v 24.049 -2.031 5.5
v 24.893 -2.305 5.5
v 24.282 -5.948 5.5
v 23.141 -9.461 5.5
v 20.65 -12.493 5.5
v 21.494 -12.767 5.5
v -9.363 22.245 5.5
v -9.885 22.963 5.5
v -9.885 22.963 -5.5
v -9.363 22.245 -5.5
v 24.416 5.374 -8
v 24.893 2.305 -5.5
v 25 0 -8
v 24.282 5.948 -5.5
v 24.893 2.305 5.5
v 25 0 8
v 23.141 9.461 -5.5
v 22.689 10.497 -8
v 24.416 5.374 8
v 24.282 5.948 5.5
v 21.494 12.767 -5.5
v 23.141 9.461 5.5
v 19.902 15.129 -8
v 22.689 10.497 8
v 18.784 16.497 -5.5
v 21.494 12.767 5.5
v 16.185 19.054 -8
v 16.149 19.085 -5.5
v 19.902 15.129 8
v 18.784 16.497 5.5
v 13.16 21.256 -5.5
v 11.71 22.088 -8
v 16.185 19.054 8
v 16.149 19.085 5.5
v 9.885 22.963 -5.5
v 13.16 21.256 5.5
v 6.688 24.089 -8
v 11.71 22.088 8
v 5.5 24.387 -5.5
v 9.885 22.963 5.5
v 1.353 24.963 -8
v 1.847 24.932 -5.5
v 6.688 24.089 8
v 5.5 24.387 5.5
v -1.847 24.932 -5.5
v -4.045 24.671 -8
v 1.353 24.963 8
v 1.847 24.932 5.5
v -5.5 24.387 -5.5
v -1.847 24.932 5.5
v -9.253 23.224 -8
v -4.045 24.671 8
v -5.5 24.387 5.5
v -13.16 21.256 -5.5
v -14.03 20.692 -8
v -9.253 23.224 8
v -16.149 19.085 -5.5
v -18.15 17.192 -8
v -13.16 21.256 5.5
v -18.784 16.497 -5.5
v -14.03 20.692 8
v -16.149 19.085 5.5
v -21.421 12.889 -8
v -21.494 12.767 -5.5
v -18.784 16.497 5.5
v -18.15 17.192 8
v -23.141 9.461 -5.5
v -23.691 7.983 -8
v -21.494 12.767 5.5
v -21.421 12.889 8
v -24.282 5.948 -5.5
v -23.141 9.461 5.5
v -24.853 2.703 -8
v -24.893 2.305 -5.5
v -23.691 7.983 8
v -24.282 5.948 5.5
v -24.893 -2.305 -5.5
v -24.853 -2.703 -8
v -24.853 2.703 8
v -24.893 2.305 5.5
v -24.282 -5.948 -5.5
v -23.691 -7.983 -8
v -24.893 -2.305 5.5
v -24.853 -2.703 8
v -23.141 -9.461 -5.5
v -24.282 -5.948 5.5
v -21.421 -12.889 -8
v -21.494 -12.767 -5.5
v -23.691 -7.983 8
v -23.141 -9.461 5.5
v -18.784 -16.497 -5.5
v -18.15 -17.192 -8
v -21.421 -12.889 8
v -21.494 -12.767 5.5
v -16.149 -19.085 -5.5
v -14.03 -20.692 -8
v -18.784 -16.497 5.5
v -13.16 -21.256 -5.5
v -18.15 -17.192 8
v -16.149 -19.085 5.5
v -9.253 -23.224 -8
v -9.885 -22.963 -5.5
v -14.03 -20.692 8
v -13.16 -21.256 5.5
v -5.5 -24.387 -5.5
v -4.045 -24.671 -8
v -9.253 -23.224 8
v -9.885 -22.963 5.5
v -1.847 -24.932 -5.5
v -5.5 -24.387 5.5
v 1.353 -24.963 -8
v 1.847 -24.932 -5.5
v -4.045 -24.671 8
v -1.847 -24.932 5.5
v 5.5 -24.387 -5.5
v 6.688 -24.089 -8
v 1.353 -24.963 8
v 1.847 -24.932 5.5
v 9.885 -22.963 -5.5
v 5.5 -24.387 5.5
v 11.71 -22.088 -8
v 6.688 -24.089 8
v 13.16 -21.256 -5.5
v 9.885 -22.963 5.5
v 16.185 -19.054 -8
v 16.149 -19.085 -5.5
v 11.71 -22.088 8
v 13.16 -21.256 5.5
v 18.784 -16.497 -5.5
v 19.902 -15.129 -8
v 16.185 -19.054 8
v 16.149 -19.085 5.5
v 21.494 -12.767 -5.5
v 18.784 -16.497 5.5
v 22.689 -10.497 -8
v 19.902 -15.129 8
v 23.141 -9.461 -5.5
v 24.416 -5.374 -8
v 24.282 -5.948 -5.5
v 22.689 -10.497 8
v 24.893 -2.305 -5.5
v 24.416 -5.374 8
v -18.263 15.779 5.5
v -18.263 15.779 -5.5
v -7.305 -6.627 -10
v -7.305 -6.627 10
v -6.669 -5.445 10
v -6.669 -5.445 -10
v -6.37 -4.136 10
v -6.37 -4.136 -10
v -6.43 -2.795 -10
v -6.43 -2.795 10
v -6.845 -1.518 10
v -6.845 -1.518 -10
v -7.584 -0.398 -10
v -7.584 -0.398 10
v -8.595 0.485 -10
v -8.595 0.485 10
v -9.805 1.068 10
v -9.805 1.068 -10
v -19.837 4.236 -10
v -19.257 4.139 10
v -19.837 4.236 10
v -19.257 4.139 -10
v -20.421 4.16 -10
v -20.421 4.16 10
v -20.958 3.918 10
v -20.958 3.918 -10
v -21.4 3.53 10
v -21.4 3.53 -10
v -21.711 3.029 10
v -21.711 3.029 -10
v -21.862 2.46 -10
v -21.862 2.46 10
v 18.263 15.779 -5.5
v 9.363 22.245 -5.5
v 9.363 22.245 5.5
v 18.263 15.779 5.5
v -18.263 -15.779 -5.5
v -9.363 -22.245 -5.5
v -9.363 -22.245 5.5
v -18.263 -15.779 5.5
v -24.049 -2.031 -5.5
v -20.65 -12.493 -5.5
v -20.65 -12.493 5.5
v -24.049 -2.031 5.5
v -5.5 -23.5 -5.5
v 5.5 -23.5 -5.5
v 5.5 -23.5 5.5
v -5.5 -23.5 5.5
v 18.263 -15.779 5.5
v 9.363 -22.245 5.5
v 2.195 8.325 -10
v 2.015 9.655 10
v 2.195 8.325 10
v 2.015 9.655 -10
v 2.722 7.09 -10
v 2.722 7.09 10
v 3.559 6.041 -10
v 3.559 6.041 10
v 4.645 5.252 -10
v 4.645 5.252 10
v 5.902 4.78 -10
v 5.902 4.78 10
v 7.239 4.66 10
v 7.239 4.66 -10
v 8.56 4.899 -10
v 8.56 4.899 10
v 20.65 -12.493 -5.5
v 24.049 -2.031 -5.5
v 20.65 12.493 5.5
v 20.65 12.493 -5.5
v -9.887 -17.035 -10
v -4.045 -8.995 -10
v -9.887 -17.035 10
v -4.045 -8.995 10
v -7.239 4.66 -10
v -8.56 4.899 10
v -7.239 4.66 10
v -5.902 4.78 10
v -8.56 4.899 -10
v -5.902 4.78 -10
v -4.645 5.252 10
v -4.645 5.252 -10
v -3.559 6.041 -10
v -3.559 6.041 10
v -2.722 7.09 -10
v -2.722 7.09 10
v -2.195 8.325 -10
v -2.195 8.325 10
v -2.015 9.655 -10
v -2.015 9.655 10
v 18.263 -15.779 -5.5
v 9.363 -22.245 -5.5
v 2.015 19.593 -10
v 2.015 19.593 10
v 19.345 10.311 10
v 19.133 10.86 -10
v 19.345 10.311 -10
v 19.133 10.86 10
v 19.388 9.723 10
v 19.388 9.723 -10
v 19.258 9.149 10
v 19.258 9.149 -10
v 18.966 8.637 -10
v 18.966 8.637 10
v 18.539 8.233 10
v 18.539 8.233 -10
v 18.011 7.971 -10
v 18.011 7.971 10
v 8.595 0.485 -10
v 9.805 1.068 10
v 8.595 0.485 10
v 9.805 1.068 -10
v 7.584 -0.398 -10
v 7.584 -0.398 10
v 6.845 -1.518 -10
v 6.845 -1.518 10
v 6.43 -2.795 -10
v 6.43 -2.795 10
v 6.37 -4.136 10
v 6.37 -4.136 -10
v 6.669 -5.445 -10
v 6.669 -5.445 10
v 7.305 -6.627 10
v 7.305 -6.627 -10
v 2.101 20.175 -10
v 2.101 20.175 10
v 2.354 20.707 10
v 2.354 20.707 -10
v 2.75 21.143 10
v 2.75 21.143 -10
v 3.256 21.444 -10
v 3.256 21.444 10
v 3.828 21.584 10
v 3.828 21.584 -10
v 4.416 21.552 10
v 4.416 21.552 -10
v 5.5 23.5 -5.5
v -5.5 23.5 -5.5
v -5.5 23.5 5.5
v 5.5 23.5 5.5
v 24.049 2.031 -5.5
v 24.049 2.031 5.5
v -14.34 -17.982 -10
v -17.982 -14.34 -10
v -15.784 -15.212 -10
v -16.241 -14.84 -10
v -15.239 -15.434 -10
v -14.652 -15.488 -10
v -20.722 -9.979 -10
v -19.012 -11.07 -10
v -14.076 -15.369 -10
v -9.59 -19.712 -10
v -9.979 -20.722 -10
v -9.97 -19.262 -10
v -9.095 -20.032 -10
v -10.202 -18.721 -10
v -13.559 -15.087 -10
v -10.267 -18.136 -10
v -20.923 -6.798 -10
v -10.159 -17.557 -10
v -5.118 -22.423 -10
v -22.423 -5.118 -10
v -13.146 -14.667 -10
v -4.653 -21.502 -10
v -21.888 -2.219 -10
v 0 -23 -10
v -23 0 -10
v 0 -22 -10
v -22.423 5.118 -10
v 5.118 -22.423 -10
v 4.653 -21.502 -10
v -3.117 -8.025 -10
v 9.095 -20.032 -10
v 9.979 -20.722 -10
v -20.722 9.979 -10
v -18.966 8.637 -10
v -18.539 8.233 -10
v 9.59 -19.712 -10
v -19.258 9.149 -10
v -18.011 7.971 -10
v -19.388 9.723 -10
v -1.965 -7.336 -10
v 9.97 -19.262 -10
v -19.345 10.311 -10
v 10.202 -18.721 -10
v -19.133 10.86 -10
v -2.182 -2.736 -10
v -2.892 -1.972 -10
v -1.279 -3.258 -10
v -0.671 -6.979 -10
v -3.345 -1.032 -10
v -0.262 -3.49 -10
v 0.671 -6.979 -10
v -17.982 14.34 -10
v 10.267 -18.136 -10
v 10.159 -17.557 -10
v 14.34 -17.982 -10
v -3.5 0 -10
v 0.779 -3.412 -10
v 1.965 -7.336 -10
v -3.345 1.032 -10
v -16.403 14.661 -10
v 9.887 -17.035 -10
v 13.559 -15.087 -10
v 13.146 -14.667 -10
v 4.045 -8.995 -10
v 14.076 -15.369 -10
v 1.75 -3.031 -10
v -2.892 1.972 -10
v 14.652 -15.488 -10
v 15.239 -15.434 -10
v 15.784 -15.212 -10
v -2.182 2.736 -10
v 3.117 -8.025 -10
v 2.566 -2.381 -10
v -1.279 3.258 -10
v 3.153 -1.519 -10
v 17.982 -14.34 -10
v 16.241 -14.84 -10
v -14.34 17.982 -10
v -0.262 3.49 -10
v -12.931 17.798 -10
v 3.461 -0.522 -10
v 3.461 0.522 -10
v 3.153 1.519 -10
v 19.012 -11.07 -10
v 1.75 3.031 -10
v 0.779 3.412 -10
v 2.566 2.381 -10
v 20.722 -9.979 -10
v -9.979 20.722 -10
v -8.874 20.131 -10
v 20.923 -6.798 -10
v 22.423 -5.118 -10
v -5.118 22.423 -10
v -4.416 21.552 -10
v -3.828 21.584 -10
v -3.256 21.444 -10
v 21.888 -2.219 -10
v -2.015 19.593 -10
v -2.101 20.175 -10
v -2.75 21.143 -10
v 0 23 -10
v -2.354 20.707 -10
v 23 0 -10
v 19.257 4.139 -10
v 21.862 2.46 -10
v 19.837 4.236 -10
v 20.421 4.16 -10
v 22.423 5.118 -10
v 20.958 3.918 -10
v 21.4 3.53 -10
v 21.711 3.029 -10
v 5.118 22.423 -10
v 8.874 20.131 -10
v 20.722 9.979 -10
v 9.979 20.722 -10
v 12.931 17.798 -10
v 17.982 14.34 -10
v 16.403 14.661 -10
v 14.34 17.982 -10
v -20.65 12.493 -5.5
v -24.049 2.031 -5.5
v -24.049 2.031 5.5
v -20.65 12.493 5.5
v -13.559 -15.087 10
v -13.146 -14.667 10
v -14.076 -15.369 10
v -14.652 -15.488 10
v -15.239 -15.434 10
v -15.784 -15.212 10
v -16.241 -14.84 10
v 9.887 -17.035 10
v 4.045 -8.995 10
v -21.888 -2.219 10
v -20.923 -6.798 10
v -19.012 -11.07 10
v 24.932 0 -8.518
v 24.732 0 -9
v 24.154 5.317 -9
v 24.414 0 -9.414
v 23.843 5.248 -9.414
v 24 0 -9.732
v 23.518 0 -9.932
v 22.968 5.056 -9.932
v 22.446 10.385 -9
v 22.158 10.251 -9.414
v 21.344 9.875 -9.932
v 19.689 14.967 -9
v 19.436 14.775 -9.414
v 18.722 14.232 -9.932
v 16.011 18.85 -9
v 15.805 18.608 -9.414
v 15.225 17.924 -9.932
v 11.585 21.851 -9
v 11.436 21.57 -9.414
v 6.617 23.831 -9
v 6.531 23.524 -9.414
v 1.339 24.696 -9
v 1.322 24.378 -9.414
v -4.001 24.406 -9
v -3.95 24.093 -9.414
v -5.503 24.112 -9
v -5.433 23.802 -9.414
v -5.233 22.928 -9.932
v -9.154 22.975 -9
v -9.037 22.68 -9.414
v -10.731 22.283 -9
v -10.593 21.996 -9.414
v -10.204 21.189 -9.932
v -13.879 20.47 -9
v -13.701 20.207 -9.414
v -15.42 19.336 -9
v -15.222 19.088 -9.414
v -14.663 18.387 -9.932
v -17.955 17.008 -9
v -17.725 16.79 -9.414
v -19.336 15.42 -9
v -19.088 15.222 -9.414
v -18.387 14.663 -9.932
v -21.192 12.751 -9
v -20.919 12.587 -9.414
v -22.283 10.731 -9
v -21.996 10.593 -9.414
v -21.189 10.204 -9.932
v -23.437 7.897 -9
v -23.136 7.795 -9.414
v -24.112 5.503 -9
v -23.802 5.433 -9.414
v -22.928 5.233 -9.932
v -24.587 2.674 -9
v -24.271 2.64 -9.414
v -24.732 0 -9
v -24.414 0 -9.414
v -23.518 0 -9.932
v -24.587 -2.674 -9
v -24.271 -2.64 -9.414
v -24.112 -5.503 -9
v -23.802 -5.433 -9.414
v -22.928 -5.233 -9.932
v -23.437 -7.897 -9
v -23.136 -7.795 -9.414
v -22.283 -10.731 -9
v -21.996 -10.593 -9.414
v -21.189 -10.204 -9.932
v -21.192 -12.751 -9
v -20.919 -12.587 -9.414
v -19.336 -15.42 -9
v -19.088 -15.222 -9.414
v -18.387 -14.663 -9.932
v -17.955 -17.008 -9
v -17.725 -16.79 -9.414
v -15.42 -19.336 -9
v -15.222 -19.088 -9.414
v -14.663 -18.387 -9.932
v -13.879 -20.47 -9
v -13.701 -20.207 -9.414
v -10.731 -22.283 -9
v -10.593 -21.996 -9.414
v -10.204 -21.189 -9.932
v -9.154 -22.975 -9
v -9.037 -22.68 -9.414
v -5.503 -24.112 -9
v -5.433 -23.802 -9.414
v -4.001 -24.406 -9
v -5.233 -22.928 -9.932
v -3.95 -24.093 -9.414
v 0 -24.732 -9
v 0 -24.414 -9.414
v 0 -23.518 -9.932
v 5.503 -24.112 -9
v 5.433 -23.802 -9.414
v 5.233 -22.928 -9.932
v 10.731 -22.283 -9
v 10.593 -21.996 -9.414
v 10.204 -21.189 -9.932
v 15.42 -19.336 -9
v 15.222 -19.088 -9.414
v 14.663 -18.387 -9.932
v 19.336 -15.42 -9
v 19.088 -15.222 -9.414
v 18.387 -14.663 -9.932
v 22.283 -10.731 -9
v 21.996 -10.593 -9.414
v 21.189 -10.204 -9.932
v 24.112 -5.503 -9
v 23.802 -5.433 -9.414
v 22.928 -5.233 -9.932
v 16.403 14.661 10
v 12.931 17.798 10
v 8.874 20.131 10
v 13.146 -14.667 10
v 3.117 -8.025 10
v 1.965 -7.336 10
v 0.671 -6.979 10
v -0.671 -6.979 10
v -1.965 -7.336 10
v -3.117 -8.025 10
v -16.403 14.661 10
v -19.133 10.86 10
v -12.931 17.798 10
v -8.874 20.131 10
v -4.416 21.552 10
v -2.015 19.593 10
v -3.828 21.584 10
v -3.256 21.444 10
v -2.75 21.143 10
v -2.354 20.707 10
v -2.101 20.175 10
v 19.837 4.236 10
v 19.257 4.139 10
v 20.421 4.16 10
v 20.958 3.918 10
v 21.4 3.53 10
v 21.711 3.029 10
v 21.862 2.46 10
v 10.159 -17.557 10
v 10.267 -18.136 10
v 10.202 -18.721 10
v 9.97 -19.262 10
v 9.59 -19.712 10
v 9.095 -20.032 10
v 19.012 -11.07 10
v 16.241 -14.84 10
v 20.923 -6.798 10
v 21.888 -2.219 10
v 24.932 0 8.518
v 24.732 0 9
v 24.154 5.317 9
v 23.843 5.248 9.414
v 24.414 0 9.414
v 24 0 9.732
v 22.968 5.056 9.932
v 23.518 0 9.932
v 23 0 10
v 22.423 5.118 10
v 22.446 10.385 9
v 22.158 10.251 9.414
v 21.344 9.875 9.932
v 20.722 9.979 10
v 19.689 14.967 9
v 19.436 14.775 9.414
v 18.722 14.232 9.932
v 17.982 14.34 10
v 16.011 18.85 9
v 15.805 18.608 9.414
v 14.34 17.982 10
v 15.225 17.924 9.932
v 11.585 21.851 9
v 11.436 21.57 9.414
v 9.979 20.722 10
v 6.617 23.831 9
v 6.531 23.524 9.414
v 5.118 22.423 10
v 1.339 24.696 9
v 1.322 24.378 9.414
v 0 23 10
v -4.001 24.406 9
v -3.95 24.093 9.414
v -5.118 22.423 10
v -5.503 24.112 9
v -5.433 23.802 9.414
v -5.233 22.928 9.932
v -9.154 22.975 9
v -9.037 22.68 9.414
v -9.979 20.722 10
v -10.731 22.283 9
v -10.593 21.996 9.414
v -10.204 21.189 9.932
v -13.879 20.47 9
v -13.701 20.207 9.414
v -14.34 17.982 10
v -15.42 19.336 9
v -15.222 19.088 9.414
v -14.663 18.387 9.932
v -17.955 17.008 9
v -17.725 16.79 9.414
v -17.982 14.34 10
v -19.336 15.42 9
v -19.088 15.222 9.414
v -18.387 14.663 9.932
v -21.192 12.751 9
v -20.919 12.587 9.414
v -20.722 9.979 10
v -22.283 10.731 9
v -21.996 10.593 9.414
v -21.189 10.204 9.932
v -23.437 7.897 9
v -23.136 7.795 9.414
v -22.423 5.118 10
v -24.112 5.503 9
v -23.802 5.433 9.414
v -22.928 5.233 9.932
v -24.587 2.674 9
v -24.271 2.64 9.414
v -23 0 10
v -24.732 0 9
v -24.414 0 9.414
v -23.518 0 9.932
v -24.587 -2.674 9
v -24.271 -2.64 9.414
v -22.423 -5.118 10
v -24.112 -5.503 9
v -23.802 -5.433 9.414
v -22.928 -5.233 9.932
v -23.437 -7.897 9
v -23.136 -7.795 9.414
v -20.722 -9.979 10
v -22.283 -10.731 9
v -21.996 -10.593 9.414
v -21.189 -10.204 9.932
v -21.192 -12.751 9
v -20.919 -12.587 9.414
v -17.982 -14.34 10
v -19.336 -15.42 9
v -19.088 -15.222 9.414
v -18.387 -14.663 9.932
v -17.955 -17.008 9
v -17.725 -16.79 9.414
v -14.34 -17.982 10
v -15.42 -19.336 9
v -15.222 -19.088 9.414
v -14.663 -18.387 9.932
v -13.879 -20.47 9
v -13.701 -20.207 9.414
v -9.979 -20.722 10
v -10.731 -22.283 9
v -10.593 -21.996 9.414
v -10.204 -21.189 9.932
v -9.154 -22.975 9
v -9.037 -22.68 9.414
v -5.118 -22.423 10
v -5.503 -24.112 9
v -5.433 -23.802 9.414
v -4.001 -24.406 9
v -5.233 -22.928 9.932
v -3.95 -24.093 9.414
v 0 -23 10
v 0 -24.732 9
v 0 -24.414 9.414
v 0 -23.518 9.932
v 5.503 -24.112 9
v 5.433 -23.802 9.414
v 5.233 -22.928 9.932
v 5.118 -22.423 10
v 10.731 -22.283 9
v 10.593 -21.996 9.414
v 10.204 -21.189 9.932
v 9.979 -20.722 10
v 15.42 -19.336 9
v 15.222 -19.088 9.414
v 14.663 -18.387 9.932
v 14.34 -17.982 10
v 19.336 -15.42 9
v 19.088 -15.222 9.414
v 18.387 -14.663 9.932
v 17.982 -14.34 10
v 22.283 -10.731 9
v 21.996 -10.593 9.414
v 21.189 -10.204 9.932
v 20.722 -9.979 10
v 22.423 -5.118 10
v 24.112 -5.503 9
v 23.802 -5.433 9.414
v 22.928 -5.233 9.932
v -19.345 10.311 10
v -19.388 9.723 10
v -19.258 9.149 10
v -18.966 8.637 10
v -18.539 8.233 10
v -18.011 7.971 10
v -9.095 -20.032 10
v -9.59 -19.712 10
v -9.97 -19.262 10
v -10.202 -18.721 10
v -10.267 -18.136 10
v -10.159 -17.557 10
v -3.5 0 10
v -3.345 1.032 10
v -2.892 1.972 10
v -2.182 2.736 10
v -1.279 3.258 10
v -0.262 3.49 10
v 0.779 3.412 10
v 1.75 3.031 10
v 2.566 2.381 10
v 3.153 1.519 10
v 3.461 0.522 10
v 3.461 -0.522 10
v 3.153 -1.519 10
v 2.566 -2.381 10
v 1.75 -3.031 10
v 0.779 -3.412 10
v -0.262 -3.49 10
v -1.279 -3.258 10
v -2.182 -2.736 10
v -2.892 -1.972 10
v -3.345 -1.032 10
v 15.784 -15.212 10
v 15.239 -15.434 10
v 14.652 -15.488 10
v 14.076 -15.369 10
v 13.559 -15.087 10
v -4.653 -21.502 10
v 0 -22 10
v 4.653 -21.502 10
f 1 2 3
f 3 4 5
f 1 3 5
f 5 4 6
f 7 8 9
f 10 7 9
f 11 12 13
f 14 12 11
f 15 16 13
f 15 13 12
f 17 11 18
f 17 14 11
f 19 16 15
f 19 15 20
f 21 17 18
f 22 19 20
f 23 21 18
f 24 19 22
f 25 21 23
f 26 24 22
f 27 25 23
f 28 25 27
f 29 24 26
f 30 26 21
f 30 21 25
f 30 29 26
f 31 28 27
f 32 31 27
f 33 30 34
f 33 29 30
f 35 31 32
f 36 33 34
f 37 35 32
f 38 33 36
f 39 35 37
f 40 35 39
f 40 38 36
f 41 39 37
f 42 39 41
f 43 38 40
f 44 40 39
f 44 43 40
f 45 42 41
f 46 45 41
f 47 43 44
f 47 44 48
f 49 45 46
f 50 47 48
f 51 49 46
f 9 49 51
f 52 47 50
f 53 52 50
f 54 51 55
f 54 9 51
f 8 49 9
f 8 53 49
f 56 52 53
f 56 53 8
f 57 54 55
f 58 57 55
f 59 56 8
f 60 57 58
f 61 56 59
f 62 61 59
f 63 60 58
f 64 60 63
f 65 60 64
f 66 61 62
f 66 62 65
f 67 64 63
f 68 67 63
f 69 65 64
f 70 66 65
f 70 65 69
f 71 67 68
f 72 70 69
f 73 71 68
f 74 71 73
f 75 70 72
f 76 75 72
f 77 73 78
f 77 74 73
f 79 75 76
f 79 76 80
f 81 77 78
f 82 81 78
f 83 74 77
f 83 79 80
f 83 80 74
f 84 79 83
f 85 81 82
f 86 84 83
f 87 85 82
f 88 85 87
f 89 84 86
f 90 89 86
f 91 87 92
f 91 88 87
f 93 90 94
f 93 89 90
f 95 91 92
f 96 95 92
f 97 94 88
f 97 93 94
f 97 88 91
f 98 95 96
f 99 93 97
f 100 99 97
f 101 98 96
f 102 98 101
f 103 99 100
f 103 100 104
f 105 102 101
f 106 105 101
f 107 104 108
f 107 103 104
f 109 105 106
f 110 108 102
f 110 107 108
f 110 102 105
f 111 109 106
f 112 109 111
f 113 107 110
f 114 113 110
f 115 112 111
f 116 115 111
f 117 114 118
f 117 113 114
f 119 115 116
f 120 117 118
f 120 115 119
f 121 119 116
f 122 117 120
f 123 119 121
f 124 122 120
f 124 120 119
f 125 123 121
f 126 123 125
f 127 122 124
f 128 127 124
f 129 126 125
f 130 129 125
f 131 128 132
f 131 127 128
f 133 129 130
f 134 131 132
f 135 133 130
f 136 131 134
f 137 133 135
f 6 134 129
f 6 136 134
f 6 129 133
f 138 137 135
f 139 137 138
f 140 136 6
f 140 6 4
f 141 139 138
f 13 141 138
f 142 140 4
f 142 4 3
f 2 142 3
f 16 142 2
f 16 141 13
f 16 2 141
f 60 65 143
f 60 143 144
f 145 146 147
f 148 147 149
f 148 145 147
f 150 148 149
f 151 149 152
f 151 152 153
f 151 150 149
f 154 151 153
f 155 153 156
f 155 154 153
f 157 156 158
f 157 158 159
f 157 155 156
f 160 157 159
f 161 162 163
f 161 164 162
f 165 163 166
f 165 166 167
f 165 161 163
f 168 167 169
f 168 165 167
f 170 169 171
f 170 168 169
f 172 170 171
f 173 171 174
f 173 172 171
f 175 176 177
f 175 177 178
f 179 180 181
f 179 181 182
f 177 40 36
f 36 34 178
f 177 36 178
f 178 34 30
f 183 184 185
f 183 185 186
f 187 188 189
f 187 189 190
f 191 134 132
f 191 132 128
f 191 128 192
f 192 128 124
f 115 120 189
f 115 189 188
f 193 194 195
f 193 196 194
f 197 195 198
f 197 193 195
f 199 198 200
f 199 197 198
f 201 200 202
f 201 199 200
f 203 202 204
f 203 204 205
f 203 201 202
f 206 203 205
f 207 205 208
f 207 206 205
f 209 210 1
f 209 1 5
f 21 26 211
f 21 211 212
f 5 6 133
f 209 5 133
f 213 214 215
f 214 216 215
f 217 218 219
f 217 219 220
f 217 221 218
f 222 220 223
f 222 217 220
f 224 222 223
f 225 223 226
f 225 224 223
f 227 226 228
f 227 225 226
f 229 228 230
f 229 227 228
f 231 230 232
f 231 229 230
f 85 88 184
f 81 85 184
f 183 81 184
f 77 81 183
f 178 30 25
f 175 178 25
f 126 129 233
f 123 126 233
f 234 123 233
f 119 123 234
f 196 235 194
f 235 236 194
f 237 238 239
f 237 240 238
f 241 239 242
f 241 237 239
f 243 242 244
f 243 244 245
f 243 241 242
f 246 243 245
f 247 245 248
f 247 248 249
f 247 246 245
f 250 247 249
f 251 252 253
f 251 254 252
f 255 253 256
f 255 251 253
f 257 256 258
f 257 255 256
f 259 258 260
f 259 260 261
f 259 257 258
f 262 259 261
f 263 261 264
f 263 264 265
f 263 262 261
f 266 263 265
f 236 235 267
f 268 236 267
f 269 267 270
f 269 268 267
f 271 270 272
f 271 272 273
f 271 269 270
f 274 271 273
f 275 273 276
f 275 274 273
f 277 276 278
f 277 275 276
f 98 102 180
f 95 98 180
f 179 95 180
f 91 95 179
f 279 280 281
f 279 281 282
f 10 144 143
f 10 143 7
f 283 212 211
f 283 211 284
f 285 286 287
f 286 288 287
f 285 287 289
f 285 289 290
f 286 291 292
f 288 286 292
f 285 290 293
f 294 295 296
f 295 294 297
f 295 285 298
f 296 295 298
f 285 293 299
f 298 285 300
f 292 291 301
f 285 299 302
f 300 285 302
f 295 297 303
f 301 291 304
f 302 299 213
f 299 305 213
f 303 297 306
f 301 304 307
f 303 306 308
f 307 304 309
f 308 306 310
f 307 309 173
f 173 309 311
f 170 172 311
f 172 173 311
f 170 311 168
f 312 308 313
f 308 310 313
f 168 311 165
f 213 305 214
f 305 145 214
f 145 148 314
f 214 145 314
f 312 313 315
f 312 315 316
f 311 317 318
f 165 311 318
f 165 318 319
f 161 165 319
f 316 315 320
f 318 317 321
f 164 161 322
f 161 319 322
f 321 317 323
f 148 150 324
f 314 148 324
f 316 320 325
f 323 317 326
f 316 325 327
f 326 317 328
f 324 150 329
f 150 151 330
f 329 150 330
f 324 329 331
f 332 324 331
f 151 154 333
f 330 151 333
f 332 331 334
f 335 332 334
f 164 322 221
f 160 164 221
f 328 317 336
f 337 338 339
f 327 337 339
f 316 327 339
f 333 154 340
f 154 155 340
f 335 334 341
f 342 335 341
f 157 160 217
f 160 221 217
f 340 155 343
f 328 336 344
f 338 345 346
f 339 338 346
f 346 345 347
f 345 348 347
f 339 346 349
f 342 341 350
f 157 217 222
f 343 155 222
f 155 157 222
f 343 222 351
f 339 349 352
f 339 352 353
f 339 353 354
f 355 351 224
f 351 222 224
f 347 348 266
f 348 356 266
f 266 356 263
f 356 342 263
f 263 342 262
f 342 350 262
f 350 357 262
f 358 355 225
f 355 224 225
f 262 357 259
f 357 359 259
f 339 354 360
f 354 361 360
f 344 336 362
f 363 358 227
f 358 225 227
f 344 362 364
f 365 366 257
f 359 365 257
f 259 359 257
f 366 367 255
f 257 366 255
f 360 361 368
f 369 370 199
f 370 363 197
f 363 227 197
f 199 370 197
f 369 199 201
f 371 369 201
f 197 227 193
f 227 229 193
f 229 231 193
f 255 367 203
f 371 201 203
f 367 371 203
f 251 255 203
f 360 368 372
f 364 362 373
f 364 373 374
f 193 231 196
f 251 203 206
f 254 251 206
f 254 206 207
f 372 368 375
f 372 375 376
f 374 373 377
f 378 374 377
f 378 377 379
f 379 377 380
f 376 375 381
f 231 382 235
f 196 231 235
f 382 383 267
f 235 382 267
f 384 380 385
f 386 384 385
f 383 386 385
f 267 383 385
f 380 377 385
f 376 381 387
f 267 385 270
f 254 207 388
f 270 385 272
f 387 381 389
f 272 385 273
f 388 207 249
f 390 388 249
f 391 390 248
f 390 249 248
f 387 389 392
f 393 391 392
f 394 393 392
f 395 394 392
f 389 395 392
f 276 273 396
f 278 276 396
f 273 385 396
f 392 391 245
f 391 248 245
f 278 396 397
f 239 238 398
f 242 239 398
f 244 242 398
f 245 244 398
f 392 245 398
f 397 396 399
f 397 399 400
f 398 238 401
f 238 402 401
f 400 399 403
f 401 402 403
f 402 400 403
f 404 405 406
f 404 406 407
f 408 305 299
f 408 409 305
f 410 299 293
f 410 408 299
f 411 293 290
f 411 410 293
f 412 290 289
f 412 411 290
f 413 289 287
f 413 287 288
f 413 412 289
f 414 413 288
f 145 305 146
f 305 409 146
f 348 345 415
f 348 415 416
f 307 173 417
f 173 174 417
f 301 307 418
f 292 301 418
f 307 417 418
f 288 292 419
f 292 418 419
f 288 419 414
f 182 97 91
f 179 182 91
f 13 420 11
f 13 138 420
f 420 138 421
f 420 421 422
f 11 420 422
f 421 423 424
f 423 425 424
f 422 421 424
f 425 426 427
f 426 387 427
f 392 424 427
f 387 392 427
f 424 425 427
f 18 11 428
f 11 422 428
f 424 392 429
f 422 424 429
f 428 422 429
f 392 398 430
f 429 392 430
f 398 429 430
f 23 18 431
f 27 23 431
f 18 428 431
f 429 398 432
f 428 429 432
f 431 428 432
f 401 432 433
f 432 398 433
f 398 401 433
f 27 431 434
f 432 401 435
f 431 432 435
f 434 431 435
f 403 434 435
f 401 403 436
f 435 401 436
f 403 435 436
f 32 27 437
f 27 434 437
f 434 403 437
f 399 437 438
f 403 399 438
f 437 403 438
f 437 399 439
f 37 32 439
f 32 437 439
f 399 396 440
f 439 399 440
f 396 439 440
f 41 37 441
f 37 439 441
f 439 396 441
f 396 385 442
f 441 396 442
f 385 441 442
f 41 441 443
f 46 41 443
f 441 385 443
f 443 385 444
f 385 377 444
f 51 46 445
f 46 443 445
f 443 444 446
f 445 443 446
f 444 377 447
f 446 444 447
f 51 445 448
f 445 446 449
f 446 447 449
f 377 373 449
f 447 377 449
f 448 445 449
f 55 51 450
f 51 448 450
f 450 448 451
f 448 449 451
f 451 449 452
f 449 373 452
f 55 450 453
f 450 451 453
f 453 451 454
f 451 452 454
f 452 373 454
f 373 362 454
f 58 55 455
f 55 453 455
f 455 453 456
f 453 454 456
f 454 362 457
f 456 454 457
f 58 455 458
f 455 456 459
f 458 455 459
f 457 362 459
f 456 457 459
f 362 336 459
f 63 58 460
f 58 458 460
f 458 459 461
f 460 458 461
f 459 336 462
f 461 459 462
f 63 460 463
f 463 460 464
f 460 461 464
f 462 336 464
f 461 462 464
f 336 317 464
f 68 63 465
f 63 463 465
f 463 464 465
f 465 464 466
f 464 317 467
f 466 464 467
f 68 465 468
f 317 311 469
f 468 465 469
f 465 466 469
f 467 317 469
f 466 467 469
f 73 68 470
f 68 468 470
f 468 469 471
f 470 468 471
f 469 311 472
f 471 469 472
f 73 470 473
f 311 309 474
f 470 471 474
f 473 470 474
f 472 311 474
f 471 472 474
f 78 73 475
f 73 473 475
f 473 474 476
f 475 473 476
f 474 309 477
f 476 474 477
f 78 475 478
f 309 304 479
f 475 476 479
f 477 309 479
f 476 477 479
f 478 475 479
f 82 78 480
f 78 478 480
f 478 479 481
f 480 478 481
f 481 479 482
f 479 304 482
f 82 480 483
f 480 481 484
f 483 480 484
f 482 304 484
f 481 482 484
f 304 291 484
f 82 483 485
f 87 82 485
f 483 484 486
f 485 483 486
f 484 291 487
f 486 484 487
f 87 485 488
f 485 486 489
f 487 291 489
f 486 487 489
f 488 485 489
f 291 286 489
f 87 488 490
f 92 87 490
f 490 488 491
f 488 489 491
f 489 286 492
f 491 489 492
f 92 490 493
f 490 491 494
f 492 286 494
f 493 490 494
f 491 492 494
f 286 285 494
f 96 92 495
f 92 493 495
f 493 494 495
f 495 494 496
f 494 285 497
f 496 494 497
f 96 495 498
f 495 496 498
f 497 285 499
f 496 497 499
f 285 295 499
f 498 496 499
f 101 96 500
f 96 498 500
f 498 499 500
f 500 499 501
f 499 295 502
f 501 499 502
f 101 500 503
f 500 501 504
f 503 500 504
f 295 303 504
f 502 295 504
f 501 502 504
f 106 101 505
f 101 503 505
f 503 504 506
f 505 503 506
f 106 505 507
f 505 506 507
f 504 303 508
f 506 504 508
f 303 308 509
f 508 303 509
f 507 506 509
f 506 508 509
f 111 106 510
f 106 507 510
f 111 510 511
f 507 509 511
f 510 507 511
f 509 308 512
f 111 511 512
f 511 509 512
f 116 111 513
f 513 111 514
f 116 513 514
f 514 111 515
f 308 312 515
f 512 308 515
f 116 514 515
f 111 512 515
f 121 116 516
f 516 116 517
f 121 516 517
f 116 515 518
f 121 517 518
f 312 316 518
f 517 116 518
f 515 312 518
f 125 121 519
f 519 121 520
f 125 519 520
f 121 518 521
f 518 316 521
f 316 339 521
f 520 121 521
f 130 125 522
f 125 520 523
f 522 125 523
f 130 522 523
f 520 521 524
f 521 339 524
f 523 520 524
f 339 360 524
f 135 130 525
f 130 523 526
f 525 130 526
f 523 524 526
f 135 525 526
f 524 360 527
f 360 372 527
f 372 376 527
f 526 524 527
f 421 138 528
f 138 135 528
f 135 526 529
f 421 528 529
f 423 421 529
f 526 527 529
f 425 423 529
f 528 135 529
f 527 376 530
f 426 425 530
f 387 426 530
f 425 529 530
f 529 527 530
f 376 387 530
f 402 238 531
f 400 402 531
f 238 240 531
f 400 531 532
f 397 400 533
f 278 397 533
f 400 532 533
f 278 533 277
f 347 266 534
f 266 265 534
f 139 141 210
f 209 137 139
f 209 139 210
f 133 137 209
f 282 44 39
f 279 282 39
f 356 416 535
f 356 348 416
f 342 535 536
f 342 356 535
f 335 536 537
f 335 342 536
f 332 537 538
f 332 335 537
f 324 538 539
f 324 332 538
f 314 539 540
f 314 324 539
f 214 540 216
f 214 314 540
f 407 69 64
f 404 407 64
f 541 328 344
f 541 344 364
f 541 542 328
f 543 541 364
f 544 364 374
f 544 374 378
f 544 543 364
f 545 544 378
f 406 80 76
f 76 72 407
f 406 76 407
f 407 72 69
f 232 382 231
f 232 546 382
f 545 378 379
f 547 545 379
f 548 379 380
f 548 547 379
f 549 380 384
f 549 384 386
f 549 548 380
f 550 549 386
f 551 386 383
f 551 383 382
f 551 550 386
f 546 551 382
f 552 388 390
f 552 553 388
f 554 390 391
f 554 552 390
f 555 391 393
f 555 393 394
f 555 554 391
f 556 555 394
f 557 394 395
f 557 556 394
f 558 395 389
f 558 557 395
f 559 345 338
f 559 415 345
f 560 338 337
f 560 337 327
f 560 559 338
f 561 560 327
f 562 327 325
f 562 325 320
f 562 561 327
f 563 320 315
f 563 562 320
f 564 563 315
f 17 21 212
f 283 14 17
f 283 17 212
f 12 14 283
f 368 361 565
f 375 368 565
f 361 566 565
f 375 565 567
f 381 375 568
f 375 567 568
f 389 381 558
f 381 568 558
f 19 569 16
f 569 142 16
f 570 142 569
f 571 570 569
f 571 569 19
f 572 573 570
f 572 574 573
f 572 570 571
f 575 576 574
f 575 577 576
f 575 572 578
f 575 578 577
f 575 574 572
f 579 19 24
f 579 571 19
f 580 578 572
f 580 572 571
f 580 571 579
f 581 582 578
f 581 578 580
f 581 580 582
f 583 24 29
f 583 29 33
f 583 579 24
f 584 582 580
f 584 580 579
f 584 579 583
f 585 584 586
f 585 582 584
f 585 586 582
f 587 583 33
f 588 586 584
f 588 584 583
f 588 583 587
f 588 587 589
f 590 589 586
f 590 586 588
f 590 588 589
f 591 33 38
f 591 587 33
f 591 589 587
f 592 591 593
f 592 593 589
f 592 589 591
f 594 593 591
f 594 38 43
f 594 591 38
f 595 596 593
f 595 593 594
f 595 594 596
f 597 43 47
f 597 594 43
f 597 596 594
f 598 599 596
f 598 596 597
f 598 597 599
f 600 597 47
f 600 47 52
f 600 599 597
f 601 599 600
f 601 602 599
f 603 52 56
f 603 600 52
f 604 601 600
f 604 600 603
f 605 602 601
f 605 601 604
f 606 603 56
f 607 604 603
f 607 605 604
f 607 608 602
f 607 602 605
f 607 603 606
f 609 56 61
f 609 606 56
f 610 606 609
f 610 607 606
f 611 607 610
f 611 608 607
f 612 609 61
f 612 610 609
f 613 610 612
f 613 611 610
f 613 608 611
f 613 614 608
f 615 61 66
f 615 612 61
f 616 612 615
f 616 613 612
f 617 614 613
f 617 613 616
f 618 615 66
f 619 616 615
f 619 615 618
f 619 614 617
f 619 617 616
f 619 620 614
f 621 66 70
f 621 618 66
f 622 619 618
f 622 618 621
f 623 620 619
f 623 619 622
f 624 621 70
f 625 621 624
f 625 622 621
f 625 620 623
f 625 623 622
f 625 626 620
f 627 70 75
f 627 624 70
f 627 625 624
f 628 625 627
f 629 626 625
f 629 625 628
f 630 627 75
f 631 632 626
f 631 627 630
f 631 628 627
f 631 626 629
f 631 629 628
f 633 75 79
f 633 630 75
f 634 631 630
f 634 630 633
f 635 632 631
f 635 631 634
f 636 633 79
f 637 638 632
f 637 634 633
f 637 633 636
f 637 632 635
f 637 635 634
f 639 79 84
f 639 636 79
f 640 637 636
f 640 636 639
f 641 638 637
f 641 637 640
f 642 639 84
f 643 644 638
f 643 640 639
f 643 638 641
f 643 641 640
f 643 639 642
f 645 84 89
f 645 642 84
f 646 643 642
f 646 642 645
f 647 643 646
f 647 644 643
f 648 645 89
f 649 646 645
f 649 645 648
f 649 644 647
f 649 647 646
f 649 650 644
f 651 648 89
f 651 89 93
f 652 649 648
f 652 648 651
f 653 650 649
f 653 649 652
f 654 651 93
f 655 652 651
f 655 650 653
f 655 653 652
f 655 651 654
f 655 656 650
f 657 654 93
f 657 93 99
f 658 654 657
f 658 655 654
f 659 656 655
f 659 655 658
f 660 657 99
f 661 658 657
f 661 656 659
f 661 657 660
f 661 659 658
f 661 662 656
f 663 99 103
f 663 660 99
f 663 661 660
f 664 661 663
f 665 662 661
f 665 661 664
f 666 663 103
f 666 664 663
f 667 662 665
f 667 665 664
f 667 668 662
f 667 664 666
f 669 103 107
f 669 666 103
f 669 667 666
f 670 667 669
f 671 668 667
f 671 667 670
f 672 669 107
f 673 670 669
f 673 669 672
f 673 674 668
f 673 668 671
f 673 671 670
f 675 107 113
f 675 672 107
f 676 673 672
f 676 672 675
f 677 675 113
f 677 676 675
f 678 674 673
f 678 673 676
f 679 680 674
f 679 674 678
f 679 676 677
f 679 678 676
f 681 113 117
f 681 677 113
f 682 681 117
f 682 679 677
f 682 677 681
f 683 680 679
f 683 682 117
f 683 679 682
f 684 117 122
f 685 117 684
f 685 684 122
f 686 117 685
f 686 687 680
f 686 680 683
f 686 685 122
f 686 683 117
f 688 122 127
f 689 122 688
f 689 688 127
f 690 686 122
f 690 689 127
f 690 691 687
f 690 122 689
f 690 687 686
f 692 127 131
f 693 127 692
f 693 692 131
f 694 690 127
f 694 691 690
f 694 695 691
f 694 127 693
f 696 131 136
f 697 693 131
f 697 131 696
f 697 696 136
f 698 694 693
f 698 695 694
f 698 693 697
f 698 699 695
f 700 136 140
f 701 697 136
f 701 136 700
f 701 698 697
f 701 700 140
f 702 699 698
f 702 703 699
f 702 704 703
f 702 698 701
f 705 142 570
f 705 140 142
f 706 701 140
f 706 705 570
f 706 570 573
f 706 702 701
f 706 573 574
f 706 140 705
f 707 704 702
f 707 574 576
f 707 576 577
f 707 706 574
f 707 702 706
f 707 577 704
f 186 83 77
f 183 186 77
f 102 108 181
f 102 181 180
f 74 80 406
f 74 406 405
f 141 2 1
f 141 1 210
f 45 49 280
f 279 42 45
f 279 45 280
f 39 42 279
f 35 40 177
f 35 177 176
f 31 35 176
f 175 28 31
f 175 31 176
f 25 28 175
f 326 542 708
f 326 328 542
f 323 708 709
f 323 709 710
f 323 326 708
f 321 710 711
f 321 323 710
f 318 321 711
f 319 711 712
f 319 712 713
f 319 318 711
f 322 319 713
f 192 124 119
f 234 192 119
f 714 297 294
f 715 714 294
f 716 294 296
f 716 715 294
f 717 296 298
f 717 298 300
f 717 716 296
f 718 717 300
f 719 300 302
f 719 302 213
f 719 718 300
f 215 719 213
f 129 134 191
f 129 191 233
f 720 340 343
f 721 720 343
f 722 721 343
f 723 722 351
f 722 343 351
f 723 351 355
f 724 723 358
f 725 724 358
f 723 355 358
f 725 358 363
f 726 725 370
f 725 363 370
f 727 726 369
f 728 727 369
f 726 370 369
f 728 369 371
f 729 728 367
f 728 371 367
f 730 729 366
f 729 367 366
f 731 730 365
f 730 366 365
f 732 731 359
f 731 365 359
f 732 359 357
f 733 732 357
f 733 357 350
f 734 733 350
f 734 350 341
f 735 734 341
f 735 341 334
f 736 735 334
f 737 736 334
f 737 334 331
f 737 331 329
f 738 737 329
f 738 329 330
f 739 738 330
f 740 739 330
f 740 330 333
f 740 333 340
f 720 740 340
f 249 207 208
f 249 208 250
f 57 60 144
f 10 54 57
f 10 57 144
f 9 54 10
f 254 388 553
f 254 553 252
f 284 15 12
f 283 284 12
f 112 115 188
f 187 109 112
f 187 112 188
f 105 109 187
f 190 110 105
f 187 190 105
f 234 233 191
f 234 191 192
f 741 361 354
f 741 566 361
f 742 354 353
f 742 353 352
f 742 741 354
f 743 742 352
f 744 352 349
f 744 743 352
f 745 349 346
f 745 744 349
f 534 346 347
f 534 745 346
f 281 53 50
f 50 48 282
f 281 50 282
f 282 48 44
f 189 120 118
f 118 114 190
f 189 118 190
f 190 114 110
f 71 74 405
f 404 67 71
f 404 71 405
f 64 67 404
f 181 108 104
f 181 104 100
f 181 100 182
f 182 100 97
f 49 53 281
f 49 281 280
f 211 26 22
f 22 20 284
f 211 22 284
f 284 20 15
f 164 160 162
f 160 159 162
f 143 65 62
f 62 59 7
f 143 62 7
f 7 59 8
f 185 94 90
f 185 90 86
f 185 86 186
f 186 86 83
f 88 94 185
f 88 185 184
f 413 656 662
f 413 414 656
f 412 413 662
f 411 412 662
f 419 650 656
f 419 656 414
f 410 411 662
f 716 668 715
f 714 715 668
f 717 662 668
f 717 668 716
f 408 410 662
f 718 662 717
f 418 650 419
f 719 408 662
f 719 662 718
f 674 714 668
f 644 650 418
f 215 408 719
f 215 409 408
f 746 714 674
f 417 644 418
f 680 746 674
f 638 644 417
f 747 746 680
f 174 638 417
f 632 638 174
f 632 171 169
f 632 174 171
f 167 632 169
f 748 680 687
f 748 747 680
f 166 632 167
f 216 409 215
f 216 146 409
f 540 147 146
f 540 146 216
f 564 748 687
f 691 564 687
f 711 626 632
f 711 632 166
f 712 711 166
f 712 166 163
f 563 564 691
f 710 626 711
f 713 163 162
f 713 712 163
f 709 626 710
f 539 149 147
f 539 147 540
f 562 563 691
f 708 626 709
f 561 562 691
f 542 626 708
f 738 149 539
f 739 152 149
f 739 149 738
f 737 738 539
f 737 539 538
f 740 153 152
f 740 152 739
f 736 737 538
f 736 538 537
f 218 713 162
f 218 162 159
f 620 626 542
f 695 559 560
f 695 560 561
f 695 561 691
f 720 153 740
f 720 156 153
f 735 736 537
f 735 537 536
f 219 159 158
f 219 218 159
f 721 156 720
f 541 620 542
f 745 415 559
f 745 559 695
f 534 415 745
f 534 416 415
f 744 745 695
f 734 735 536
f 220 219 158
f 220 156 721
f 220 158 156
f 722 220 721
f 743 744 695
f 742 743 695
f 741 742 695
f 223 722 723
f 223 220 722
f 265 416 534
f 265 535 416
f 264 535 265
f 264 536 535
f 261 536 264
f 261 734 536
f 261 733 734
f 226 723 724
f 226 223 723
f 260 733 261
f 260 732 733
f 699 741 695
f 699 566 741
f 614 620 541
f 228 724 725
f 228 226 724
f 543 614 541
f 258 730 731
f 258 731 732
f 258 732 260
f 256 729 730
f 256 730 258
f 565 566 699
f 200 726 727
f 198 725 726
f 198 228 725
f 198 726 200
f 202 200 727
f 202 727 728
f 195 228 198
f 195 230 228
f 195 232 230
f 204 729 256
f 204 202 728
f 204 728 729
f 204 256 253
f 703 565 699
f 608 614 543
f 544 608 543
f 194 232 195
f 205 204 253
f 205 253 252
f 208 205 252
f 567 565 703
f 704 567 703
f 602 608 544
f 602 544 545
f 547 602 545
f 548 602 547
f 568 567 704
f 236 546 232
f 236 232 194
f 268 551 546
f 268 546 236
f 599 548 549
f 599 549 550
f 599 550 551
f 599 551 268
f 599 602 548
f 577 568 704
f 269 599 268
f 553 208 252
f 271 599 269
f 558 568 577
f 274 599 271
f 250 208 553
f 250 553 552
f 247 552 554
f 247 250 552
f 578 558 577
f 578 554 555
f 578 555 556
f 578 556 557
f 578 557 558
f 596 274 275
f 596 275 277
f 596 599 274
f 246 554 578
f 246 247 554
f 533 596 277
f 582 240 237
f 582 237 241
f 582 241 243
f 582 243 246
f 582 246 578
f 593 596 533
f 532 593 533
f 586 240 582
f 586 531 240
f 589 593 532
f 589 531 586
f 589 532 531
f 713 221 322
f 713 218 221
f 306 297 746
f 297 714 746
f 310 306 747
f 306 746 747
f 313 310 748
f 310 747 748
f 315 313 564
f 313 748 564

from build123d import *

# Parameters (mm, degrees)
SKETCH1_R           = 25
BOSS_EXTRUDE1_DEPTH = 10
FILLET1_R           = 2
FILLET2_R           = 2
FILLET3_R           = 5
CUT_EXTRUDE2_START  = 26
SKETCH4_W           = 11
SKETCH4_H           = 11
CUT_EXTRUDE2_DEPTH  = 2.5
CIRPATTERN1_COUNT   = 10
SKETCH2_R           = 3.5
CUT_EXTRUDE1_DEPTH  = 21


with BuildPart() as part:
    # Sketch1 → Boss-Extrude1 (new body, symmetric)
    with BuildSketch(Plane.XY):
        Circle(SKETCH1_R)
        with BuildLine():
            Line((-2.01454878, 21.907569313), (-2.01454878, 2.772788518))
            Line((-2.01454878, 2.772788518), (-20.212806743, 8.685760967))
            ThreePointArc((-20.212806743, 8.685760967), (-12.93127555, 17.798373876), (-2.01454878, 21.907569313))
        make_face(mode=Mode.SUBTRACT)
        with BuildLine():
            Line((2.01454878, 21.907569313), (2.01454878, 2.772788518))
            Line((2.01454878, 2.772788518), (20.212806743, 8.685760967))
            ThreePointArc((20.212806743, 8.685760967), (12.93127555, 17.798373876), (2.01454878, 21.907569313))
        make_face(mode=Mode.SUBTRACT)
        with BuildLine():
            Line((21.45786636, 4.853861479), (3.259608397, -1.05911097))
            Line((3.259608397, -1.05911097), (14.506750355, -16.539473817))
            ThreePointArc((14.506750355, -16.539473817), (20.923243358, -6.798373876), (21.45786636, 4.853861479))
        make_face(mode=Mode.SUBTRACT)
        with BuildLine():
            Line((11.247141957, -18.907717943), (0, -3.427355096))
            Line((0, -3.427355096), (-11.247141957, -18.907717943))
            ThreePointArc((-11.247141957, -18.907717943), (0, -22), (11.247141957, -18.907717943))
        make_face(mode=Mode.SUBTRACT)
        with BuildLine():
            Line((-14.506750355, -16.539473817), (-3.259608397, -1.05911097))
            Line((-3.259608397, -1.05911097), (-21.45786636, 4.853861479))
            ThreePointArc((-21.45786636, 4.853861479), (-20.923243358, -6.798373876), (-14.506750355, -16.539473817))
        make_face(mode=Mode.SUBTRACT)
    extrude(amount=BOSS_EXTRUDE1_DEPTH, both=True)

    # Fillet1
    fillet1_edges = [part.edges().sort_by_distance(p)[0] for p in [
        (-25, 0, -10),
        (-25, 0, 10),
    ]]
    fillet(fillet1_edges, radius=FILLET1_R)

    # Fillet2
    fillet2_edges = [part.edges().sort_by_distance(p)[0] for p in [
        (-20.212806743, 8.685760967, 0),
        (-2.01454878, 21.907569313, 0),
        (-14.506750355, -16.539473817, 0),
        (-21.45786636, 4.853861479, 0),
        (11.247141957, -18.907717943, 0),
        (-11.247141957, -18.907717943, 0),
        (21.45786636, 4.853861479, 0),
        (14.506750355, -16.539473817, 0),
        (2.01454878, 21.907569313, 0),
        (20.212806743, 8.685760967, 0),
    ]]
    fillet(fillet2_edges, radius=FILLET2_R)

    # Fillet3
    fillet3_edges = [part.edges().sort_by_distance(p)[0] for p in [
        (-2.01454878, 2.772788518, 0),
        (-3.259608397, -1.05911097, 0),
        (0, -3.427355096, 0),
        (3.259608397, -1.05911097, 0),
        (2.01454878, 2.772788518, 0),
    ]]
    fillet(fillet3_edges, radius=FILLET3_R)

    # Sketch4 → Cut-Extrude2 (cut)
    with BuildSketch(Plane(origin=(0, 0, 0), x_dir=(1, 0, 0), z_dir=(0, 1, 0)).offset(CUT_EXTRUDE2_START)):
        Rectangle(SKETCH4_W, SKETCH4_H)
    cut_extrude2 = extrude(amount=-CUT_EXTRUDE2_DEPTH, mode=Mode.SUBTRACT)

    # CirPattern1: Cut-Extrude2 ×10 about axis
    cirpattern1_axis = Axis((0, 0, 0), (0, 0, 1))
    for i in range(1, CIRPATTERN1_COUNT):
        add(cut_extrude2.rotate(cirpattern1_axis, i * 360 / CIRPATTERN1_COUNT), mode=Mode.SUBTRACT)

    # Sketch2 → Cut-Extrude1 (cut, through all)
    with BuildSketch(Plane(origin=(0, 0, -10), x_dir=(-1, 0, 0), z_dir=(0, 0, -1))):
        Circle(SKETCH2_R)
    extrude(amount=-CUT_EXTRUDE1_DEPTH, mode=Mode.SUBTRACT)


solid = part.part
